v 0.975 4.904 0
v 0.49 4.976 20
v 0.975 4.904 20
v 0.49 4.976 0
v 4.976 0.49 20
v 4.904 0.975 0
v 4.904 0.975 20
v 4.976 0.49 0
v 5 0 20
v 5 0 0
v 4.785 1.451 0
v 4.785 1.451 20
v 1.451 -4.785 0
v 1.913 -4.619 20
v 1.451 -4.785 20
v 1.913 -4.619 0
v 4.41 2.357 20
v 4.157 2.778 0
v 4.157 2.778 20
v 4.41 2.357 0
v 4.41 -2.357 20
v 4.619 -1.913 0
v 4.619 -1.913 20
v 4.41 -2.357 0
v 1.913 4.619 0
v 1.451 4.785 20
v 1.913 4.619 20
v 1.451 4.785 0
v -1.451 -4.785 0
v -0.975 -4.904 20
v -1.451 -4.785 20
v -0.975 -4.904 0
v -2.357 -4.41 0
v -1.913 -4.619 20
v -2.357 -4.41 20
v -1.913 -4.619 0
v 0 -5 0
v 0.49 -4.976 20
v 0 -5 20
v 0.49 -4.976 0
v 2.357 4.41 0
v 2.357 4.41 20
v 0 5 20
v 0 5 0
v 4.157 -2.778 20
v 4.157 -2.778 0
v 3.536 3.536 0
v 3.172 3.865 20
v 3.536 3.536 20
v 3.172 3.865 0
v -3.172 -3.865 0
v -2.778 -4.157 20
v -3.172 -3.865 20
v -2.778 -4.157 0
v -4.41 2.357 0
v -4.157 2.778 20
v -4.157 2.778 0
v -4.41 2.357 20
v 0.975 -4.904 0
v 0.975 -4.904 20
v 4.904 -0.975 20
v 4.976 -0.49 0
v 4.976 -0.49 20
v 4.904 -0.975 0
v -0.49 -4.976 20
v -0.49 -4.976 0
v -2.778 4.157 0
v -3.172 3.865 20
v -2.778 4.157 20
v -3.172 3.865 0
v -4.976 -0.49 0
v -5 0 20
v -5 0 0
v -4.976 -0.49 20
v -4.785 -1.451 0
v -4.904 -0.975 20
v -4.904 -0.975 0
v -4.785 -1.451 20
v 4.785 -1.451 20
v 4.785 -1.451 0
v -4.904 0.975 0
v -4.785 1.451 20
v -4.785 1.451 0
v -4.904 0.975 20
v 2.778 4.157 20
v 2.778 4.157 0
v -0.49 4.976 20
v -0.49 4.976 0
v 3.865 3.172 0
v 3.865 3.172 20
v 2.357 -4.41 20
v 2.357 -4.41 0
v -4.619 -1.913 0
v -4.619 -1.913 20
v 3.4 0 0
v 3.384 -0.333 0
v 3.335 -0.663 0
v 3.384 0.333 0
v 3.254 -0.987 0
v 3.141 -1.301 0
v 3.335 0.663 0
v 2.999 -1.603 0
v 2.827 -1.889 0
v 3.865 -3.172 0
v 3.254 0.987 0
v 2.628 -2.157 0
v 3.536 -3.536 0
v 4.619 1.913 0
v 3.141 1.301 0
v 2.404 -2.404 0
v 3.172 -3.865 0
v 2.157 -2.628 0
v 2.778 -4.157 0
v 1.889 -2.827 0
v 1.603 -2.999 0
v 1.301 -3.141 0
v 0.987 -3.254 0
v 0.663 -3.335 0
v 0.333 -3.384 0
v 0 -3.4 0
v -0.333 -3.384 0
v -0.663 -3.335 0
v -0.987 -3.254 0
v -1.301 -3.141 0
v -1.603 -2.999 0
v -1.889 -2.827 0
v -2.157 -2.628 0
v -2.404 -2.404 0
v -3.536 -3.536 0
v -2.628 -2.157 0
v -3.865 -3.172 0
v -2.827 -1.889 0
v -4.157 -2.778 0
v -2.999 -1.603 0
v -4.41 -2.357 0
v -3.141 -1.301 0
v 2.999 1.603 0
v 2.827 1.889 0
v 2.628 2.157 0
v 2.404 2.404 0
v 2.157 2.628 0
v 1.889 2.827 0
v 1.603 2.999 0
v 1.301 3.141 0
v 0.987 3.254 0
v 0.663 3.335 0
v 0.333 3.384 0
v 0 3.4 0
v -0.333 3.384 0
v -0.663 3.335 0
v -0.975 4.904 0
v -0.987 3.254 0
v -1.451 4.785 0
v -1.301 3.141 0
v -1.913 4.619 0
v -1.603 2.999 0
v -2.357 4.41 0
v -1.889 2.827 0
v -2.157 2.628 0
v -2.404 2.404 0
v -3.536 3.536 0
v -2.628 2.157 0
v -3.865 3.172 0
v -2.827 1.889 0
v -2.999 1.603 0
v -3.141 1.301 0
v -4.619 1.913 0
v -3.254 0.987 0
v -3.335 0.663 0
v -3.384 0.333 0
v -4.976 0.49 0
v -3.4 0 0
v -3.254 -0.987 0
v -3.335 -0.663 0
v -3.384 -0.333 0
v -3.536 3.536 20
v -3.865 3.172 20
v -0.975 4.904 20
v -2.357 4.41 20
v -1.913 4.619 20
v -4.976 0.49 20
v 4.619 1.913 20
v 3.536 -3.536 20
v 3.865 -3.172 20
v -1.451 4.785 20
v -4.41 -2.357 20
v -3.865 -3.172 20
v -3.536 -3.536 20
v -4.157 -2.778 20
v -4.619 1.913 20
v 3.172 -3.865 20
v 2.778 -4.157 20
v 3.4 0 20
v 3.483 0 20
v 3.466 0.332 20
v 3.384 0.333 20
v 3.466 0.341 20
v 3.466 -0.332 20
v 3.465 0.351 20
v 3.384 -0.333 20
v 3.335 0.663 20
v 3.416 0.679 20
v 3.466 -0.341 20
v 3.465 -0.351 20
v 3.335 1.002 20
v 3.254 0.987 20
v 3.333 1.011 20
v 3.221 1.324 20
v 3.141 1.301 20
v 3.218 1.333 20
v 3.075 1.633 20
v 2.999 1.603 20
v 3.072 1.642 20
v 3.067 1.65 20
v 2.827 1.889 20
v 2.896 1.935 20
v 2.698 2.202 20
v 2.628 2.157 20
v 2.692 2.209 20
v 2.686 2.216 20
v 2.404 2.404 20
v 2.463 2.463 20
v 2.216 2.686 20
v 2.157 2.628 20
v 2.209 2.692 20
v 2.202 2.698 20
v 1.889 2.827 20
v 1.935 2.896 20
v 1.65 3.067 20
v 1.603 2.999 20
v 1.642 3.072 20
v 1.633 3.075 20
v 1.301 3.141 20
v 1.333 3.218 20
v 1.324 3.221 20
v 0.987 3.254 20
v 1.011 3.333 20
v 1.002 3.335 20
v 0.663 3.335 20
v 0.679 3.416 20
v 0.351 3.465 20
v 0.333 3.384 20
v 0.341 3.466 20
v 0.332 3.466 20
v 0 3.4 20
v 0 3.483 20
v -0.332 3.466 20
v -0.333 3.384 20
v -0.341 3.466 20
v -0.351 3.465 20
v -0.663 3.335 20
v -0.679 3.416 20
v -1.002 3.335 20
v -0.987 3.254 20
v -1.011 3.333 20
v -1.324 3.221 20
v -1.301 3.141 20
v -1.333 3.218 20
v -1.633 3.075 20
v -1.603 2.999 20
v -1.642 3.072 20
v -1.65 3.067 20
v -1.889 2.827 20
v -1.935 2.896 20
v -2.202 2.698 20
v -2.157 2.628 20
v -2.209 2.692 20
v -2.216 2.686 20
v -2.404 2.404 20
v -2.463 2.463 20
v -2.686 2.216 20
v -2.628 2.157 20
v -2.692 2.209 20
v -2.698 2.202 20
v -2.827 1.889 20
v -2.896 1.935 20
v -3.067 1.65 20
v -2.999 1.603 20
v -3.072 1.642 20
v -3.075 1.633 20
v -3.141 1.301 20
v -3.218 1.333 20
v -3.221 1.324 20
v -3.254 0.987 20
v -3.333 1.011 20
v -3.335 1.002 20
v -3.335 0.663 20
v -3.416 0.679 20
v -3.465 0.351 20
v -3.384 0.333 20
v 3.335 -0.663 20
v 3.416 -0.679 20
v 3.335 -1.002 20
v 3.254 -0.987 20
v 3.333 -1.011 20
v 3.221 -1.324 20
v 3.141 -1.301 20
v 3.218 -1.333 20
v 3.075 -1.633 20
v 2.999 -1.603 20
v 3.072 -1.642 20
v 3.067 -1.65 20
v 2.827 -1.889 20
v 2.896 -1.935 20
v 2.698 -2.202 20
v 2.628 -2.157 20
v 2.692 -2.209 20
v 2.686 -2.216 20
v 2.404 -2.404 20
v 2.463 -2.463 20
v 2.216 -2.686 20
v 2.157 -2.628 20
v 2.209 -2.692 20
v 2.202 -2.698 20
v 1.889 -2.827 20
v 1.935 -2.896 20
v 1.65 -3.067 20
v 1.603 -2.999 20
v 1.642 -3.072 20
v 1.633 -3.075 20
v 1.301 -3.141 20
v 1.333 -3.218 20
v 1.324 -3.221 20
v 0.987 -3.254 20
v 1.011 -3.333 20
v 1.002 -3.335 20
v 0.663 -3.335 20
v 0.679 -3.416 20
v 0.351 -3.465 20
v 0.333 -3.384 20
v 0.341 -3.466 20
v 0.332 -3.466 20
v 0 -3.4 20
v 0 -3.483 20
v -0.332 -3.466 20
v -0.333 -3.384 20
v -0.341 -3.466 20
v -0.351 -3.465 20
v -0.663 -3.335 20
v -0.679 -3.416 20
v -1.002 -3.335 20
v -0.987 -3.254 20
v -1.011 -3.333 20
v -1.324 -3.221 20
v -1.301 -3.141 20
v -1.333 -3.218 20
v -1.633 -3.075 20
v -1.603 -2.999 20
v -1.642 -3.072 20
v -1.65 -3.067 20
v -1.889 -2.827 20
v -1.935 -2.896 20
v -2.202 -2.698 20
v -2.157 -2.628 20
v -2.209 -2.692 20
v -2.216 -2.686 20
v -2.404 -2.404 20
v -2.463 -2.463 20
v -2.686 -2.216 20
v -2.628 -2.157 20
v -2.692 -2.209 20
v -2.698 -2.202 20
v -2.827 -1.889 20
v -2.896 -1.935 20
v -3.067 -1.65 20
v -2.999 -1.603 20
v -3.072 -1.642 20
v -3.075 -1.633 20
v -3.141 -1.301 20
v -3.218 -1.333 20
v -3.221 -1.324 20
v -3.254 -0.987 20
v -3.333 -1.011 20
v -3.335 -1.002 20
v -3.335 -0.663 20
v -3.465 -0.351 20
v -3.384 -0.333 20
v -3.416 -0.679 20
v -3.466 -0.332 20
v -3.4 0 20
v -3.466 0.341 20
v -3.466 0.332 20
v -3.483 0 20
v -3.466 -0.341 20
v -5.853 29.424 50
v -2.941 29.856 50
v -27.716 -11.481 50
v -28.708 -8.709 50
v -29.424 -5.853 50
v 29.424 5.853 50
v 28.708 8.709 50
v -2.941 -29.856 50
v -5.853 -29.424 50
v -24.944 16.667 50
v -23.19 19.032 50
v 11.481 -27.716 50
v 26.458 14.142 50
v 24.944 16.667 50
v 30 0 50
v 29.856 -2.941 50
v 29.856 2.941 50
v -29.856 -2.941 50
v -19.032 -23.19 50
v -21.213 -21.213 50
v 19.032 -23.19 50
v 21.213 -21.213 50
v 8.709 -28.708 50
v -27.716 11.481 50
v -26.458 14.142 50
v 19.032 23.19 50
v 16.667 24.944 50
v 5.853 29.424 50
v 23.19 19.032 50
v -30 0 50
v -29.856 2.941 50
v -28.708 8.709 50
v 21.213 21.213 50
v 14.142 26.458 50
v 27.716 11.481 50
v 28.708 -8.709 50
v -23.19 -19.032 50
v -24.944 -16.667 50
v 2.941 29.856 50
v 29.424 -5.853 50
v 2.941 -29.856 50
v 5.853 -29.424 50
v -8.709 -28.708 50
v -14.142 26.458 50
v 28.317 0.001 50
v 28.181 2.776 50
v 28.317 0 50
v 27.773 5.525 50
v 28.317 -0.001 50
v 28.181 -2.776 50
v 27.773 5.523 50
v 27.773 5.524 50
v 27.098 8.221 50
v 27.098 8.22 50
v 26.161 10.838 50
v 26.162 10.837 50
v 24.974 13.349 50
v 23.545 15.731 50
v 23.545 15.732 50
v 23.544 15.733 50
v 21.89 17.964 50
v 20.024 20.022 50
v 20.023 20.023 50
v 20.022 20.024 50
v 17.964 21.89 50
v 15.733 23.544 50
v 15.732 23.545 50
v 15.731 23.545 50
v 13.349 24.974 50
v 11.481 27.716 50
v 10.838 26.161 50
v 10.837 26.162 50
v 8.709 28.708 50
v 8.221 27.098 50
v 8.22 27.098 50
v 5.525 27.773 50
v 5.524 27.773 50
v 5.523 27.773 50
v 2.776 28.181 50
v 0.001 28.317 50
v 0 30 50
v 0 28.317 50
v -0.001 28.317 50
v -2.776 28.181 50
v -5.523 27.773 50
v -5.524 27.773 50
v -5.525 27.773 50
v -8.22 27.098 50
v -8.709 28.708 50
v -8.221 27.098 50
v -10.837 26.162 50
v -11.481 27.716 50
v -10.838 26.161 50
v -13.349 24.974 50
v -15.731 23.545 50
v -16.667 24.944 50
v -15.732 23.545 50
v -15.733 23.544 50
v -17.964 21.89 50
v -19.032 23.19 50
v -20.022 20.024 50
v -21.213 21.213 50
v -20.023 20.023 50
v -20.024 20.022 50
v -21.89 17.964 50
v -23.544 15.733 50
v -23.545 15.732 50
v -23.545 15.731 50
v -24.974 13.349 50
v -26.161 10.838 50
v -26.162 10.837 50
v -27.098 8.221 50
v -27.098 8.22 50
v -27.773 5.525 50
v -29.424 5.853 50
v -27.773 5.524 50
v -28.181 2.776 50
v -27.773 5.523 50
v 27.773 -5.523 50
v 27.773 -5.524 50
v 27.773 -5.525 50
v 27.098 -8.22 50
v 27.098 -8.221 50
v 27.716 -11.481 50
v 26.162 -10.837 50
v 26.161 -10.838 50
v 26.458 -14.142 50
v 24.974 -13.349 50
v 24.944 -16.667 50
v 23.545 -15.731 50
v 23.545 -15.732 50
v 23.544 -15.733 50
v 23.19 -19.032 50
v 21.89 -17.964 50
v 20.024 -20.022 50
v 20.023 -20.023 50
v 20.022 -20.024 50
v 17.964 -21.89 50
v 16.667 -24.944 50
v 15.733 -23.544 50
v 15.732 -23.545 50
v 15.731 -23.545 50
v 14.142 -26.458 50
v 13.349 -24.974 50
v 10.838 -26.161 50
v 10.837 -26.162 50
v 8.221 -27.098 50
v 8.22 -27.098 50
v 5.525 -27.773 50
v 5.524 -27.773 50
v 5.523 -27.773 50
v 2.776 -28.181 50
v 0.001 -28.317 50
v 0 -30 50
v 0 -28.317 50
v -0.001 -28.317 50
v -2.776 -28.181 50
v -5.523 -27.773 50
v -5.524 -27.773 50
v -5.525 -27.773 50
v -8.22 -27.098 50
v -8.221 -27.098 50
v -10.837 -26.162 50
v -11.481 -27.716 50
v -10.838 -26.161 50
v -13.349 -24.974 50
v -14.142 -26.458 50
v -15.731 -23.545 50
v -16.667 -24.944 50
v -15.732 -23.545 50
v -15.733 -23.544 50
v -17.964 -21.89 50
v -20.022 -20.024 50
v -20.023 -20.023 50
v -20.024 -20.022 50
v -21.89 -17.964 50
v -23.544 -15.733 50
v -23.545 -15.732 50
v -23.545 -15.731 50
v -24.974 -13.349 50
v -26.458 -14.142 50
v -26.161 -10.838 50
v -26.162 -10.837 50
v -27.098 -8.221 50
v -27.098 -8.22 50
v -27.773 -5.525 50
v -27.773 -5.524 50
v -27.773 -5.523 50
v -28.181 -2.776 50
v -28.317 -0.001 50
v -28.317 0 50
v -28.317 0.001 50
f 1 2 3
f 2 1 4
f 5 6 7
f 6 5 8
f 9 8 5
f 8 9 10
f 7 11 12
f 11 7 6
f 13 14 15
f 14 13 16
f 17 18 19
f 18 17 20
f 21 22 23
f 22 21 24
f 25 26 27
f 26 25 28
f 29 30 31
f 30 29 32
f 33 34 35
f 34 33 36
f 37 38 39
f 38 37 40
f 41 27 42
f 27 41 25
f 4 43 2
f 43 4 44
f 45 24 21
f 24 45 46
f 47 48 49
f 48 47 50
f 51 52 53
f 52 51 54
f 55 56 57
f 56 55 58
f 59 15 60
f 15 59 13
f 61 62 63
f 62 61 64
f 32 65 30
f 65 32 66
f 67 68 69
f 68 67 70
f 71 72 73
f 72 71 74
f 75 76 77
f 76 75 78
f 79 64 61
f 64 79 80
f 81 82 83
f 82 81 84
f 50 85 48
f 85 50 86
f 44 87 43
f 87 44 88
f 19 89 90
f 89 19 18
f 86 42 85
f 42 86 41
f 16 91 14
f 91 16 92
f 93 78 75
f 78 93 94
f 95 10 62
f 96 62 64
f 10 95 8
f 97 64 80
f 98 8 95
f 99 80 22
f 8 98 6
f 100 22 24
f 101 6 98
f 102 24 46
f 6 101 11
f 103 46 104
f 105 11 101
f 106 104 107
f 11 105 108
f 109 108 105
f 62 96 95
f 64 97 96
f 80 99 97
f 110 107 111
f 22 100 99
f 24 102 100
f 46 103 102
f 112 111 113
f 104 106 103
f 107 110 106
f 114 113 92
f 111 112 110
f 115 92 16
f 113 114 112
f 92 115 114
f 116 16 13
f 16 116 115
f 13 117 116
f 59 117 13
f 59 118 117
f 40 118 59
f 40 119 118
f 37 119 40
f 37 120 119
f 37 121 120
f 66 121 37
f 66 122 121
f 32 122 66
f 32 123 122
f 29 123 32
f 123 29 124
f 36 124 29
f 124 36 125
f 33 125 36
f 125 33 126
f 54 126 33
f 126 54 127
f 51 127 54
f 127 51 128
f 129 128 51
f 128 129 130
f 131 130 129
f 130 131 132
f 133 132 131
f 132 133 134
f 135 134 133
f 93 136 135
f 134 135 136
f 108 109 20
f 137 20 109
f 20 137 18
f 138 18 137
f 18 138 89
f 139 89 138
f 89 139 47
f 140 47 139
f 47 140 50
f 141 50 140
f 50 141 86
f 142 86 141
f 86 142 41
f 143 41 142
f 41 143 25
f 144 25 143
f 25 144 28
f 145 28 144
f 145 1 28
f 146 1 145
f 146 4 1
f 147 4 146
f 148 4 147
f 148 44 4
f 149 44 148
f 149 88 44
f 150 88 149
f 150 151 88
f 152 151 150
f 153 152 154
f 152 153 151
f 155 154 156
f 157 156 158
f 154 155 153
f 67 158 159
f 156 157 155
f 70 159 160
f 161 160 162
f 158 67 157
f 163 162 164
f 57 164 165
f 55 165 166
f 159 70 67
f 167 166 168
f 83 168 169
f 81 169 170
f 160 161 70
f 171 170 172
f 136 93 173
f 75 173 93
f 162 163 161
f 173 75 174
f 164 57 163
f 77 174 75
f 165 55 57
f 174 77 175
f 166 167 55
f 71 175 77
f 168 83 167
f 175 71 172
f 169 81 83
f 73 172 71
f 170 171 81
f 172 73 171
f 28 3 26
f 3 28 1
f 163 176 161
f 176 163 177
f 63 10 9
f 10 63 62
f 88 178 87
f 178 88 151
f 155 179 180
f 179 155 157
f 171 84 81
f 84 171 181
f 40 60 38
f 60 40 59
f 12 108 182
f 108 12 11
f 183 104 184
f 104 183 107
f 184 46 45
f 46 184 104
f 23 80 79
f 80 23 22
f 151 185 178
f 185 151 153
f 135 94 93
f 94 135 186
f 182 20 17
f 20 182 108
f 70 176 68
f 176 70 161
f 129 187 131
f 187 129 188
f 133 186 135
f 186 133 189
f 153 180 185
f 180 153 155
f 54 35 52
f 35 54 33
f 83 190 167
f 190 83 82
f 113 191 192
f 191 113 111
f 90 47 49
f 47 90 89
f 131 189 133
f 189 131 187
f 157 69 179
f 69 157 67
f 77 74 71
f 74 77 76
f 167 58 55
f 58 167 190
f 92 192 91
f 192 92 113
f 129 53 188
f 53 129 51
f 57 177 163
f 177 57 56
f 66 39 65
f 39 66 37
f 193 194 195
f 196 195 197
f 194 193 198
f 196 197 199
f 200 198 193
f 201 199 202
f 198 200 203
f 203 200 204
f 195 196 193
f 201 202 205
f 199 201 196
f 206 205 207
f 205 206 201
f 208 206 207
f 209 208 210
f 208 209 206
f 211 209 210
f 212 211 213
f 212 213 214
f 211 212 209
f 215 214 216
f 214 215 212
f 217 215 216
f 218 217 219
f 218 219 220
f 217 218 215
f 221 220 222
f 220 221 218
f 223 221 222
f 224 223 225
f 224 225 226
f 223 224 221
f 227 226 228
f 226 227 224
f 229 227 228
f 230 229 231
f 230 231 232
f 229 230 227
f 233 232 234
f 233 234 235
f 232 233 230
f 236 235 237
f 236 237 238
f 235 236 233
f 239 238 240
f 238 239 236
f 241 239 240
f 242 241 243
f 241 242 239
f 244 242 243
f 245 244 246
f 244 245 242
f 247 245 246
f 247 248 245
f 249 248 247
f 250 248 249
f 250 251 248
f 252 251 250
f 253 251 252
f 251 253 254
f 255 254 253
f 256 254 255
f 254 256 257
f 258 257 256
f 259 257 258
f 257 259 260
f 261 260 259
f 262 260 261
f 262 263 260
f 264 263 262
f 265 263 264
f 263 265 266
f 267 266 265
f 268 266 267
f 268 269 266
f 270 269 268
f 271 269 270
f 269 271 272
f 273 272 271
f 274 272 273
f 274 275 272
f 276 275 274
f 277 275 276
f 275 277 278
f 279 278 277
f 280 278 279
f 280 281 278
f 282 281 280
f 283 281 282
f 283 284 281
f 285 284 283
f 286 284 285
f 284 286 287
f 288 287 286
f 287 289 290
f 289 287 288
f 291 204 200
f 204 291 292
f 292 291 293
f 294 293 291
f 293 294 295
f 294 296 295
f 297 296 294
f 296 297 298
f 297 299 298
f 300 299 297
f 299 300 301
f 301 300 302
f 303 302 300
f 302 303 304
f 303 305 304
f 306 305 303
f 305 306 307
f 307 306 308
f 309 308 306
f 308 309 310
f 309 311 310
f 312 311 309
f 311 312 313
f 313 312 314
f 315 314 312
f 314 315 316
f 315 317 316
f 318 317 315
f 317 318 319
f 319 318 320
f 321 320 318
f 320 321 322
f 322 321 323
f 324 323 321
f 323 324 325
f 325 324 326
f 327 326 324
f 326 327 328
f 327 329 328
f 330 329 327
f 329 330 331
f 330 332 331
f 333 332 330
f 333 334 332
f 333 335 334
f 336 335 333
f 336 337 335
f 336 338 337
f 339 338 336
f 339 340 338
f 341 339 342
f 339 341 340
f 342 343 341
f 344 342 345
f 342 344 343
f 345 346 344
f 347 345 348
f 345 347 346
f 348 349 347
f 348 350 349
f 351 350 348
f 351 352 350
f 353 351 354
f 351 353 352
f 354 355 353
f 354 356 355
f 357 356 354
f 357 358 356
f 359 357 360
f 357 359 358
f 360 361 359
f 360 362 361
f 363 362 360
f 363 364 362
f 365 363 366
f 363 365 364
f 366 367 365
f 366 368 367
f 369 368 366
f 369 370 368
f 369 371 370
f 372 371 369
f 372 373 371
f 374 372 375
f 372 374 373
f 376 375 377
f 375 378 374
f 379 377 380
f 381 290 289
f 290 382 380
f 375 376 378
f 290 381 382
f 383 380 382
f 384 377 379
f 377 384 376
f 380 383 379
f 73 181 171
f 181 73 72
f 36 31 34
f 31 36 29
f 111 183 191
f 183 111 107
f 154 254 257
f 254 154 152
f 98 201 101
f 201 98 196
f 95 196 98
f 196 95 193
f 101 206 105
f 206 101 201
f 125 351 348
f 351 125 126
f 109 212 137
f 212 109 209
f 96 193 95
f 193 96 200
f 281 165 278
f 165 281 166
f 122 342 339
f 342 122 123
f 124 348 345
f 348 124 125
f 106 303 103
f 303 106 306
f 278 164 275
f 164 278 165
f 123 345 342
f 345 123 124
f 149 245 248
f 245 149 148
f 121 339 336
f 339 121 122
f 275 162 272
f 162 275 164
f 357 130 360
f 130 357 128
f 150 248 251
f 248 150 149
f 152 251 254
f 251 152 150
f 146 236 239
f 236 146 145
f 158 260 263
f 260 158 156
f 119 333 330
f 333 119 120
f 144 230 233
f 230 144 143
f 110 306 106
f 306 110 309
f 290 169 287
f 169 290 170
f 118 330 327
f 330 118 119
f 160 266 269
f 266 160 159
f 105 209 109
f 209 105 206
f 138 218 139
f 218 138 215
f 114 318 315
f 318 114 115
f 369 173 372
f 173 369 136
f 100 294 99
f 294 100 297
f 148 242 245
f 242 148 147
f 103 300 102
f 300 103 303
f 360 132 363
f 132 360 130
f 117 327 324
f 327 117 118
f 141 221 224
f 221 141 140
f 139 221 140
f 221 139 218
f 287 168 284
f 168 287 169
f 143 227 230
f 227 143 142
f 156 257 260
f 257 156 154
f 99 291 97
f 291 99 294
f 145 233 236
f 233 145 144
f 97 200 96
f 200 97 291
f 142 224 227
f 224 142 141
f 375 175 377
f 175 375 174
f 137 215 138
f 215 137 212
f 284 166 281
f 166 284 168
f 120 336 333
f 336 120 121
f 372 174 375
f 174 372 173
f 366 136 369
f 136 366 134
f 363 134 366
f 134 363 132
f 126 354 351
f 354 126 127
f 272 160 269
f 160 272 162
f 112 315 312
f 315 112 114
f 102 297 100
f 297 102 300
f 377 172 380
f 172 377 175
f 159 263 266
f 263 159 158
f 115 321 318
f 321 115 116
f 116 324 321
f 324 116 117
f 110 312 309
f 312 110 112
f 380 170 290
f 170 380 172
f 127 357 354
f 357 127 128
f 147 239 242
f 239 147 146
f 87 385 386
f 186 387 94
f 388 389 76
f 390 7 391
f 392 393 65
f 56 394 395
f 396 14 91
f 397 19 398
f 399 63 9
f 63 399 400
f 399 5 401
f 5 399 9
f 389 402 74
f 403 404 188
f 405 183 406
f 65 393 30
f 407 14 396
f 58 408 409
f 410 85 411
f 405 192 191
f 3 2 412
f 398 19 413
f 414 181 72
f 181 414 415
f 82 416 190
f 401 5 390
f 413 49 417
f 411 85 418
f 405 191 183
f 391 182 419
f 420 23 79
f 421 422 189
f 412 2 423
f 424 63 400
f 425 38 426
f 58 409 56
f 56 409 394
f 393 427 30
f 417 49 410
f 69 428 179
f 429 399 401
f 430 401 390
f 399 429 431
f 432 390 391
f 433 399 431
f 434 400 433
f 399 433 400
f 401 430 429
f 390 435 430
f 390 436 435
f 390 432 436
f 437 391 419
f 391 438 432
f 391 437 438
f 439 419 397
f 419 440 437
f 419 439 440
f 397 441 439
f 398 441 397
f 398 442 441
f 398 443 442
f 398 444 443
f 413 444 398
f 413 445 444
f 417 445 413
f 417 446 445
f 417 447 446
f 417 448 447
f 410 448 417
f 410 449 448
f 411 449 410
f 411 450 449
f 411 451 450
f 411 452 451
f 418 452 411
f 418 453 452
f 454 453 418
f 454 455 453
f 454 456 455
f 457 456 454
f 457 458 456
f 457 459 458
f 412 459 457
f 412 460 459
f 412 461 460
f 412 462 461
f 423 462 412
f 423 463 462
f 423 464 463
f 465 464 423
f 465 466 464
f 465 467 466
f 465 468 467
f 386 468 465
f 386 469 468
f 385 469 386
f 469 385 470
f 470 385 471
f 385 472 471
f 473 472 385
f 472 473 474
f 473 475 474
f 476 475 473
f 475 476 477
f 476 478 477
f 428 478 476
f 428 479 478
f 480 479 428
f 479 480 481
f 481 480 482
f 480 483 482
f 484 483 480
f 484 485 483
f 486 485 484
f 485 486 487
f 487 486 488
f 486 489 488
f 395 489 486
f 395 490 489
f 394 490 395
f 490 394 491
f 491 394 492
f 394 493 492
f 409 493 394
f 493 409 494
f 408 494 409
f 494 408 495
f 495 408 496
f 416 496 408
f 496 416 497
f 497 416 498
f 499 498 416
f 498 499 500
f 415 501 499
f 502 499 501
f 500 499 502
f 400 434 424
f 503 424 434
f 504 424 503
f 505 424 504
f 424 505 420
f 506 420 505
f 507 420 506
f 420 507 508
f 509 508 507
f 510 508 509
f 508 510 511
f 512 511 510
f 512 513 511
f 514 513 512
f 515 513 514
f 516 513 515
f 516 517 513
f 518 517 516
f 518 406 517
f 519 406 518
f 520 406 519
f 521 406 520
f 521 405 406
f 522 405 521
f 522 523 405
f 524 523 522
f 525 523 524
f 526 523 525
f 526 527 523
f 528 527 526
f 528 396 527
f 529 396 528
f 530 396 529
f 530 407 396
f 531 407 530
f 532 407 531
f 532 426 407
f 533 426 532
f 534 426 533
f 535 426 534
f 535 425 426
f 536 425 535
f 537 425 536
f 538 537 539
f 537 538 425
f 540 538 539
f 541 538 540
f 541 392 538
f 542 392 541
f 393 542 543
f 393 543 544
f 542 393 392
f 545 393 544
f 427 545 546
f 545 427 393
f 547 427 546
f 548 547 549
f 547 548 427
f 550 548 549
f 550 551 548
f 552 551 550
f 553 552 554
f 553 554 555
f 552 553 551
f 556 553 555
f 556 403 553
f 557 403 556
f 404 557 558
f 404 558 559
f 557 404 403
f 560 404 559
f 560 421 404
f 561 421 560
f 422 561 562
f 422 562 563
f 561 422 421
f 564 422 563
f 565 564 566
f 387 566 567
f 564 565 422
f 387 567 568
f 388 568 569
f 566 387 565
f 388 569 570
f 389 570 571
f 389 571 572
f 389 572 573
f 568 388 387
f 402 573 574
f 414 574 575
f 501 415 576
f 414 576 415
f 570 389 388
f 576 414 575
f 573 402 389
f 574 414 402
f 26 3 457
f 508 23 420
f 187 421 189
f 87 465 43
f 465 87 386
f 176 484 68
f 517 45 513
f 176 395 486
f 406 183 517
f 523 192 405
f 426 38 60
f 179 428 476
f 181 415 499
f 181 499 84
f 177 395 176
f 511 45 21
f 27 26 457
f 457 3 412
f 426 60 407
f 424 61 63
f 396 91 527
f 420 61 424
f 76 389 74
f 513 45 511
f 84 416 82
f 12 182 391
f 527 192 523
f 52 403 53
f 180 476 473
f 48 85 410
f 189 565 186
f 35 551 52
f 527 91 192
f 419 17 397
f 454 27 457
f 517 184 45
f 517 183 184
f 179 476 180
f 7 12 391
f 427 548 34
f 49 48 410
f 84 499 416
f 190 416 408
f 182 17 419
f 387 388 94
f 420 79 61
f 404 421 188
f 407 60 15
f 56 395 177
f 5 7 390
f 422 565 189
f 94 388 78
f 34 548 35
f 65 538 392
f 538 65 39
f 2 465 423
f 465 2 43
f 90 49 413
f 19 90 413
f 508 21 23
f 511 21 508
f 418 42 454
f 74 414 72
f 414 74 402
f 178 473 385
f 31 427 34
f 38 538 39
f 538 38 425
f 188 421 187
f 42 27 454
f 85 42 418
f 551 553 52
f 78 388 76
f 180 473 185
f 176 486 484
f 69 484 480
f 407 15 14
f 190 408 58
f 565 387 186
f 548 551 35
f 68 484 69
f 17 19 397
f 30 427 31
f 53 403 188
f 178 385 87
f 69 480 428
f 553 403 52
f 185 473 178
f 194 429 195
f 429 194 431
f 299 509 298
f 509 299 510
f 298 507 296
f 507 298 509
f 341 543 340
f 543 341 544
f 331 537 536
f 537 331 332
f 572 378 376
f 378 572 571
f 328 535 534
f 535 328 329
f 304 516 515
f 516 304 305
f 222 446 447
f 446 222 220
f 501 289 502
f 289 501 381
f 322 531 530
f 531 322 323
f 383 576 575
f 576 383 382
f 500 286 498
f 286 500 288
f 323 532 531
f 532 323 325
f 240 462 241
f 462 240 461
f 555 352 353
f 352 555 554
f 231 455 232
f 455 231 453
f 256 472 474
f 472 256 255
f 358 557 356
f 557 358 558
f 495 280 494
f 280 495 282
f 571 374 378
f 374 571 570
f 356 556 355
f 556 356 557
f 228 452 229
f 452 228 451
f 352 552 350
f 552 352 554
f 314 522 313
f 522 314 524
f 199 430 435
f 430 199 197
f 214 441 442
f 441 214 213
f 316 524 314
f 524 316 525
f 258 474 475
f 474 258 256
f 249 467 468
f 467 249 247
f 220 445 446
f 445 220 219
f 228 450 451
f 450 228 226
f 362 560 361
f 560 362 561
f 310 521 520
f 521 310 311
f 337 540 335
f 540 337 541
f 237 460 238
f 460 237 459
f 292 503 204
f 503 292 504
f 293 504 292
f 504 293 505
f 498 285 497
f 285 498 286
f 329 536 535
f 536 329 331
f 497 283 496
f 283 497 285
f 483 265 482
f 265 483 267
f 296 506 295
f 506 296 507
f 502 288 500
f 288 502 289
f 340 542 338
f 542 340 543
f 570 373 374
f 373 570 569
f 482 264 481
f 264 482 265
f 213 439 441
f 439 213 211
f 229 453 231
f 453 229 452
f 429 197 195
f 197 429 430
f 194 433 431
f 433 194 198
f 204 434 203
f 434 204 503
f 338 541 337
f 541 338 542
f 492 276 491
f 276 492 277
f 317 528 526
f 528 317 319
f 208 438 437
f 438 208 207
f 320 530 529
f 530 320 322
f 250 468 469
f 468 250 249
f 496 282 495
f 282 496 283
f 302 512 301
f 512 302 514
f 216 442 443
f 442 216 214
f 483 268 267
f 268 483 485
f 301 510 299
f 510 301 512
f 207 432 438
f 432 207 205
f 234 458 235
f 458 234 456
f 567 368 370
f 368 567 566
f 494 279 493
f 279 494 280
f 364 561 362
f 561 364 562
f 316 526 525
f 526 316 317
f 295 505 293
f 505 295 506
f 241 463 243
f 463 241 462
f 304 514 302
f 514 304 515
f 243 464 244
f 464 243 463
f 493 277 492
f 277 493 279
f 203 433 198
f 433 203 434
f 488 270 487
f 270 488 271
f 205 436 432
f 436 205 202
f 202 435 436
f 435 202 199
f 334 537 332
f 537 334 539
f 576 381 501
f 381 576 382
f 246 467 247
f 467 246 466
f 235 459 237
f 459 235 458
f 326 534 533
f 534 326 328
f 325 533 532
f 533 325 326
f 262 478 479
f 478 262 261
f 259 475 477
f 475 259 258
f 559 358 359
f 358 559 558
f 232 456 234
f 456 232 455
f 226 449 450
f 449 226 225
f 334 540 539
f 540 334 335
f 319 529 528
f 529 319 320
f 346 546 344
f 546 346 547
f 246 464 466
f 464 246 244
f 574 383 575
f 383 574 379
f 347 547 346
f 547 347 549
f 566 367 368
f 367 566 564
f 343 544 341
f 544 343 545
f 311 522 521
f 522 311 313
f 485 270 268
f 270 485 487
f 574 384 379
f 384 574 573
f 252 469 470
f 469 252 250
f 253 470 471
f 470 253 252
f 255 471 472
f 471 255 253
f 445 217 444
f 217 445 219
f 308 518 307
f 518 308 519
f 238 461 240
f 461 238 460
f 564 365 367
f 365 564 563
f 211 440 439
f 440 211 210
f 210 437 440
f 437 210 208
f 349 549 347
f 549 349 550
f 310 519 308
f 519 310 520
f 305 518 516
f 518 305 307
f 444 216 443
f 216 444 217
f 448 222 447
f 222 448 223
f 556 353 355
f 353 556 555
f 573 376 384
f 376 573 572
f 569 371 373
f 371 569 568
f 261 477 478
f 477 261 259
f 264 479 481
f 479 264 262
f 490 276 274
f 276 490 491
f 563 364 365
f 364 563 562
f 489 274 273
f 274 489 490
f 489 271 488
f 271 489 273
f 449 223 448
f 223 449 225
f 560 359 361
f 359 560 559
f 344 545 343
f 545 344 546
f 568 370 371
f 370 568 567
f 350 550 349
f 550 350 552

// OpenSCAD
// Lab Funnel Design
// Wall thickness: 1.6 mm
// Spout: 10 mm outer diameter, 20 mm tall (z = 0 to z = 20)
// Cone: 10 mm outer diameter at z = 20, 60 mm outer diameter at z = 50

$fn = 64;

wall_thickness = 1.6;
spout_height = 20;
spout_outer_diameter = 10;
spout_inner_diameter = spout_outer_diameter - 2 * wall_thickness;
cone_height = 30; // from z=20 to z=50
cone_top_outer_diameter = spout_outer_diameter;
cone_bottom_outer_diameter = 60;
cone_top_inner_diameter = spout_inner_diameter;
cone_bottom_inner_diameter = cone_bottom_outer_diameter - 2 * wall_thickness;

// Spout (cylinder with hole)
module spout() {
    difference() {
        cylinder(h = spout_height, d = spout_outer_diameter, center = false);
        translate([0, 0, -0.1]) 
            cylinder(h = spout_height + 0.2, d = spout_inner_diameter, center = false);
    }
}

// Cone (frustum with hole)
module cone() {
    translate([0, 0, spout_height]) {
        difference() {
            // Outer cone
            cylinder(h = cone_height, 
                     r1 = cone_top_outer_diameter / 2, 
                     r2 = cone_bottom_outer_diameter / 2, 
                     center = false);
            // Inner cone (with correct wall thickness)
            translate([0, 0, -0.1]) 
                cylinder(h = cone_height + 0.2, 
                         r1 = cone_top_inner_diameter / 2, 
                         r2 = cone_bottom_inner_diameter / 2, 
                         center = false);
        }
    }
}

// Build the funnel as a single union
union() {
    spout();
    cone();
}
